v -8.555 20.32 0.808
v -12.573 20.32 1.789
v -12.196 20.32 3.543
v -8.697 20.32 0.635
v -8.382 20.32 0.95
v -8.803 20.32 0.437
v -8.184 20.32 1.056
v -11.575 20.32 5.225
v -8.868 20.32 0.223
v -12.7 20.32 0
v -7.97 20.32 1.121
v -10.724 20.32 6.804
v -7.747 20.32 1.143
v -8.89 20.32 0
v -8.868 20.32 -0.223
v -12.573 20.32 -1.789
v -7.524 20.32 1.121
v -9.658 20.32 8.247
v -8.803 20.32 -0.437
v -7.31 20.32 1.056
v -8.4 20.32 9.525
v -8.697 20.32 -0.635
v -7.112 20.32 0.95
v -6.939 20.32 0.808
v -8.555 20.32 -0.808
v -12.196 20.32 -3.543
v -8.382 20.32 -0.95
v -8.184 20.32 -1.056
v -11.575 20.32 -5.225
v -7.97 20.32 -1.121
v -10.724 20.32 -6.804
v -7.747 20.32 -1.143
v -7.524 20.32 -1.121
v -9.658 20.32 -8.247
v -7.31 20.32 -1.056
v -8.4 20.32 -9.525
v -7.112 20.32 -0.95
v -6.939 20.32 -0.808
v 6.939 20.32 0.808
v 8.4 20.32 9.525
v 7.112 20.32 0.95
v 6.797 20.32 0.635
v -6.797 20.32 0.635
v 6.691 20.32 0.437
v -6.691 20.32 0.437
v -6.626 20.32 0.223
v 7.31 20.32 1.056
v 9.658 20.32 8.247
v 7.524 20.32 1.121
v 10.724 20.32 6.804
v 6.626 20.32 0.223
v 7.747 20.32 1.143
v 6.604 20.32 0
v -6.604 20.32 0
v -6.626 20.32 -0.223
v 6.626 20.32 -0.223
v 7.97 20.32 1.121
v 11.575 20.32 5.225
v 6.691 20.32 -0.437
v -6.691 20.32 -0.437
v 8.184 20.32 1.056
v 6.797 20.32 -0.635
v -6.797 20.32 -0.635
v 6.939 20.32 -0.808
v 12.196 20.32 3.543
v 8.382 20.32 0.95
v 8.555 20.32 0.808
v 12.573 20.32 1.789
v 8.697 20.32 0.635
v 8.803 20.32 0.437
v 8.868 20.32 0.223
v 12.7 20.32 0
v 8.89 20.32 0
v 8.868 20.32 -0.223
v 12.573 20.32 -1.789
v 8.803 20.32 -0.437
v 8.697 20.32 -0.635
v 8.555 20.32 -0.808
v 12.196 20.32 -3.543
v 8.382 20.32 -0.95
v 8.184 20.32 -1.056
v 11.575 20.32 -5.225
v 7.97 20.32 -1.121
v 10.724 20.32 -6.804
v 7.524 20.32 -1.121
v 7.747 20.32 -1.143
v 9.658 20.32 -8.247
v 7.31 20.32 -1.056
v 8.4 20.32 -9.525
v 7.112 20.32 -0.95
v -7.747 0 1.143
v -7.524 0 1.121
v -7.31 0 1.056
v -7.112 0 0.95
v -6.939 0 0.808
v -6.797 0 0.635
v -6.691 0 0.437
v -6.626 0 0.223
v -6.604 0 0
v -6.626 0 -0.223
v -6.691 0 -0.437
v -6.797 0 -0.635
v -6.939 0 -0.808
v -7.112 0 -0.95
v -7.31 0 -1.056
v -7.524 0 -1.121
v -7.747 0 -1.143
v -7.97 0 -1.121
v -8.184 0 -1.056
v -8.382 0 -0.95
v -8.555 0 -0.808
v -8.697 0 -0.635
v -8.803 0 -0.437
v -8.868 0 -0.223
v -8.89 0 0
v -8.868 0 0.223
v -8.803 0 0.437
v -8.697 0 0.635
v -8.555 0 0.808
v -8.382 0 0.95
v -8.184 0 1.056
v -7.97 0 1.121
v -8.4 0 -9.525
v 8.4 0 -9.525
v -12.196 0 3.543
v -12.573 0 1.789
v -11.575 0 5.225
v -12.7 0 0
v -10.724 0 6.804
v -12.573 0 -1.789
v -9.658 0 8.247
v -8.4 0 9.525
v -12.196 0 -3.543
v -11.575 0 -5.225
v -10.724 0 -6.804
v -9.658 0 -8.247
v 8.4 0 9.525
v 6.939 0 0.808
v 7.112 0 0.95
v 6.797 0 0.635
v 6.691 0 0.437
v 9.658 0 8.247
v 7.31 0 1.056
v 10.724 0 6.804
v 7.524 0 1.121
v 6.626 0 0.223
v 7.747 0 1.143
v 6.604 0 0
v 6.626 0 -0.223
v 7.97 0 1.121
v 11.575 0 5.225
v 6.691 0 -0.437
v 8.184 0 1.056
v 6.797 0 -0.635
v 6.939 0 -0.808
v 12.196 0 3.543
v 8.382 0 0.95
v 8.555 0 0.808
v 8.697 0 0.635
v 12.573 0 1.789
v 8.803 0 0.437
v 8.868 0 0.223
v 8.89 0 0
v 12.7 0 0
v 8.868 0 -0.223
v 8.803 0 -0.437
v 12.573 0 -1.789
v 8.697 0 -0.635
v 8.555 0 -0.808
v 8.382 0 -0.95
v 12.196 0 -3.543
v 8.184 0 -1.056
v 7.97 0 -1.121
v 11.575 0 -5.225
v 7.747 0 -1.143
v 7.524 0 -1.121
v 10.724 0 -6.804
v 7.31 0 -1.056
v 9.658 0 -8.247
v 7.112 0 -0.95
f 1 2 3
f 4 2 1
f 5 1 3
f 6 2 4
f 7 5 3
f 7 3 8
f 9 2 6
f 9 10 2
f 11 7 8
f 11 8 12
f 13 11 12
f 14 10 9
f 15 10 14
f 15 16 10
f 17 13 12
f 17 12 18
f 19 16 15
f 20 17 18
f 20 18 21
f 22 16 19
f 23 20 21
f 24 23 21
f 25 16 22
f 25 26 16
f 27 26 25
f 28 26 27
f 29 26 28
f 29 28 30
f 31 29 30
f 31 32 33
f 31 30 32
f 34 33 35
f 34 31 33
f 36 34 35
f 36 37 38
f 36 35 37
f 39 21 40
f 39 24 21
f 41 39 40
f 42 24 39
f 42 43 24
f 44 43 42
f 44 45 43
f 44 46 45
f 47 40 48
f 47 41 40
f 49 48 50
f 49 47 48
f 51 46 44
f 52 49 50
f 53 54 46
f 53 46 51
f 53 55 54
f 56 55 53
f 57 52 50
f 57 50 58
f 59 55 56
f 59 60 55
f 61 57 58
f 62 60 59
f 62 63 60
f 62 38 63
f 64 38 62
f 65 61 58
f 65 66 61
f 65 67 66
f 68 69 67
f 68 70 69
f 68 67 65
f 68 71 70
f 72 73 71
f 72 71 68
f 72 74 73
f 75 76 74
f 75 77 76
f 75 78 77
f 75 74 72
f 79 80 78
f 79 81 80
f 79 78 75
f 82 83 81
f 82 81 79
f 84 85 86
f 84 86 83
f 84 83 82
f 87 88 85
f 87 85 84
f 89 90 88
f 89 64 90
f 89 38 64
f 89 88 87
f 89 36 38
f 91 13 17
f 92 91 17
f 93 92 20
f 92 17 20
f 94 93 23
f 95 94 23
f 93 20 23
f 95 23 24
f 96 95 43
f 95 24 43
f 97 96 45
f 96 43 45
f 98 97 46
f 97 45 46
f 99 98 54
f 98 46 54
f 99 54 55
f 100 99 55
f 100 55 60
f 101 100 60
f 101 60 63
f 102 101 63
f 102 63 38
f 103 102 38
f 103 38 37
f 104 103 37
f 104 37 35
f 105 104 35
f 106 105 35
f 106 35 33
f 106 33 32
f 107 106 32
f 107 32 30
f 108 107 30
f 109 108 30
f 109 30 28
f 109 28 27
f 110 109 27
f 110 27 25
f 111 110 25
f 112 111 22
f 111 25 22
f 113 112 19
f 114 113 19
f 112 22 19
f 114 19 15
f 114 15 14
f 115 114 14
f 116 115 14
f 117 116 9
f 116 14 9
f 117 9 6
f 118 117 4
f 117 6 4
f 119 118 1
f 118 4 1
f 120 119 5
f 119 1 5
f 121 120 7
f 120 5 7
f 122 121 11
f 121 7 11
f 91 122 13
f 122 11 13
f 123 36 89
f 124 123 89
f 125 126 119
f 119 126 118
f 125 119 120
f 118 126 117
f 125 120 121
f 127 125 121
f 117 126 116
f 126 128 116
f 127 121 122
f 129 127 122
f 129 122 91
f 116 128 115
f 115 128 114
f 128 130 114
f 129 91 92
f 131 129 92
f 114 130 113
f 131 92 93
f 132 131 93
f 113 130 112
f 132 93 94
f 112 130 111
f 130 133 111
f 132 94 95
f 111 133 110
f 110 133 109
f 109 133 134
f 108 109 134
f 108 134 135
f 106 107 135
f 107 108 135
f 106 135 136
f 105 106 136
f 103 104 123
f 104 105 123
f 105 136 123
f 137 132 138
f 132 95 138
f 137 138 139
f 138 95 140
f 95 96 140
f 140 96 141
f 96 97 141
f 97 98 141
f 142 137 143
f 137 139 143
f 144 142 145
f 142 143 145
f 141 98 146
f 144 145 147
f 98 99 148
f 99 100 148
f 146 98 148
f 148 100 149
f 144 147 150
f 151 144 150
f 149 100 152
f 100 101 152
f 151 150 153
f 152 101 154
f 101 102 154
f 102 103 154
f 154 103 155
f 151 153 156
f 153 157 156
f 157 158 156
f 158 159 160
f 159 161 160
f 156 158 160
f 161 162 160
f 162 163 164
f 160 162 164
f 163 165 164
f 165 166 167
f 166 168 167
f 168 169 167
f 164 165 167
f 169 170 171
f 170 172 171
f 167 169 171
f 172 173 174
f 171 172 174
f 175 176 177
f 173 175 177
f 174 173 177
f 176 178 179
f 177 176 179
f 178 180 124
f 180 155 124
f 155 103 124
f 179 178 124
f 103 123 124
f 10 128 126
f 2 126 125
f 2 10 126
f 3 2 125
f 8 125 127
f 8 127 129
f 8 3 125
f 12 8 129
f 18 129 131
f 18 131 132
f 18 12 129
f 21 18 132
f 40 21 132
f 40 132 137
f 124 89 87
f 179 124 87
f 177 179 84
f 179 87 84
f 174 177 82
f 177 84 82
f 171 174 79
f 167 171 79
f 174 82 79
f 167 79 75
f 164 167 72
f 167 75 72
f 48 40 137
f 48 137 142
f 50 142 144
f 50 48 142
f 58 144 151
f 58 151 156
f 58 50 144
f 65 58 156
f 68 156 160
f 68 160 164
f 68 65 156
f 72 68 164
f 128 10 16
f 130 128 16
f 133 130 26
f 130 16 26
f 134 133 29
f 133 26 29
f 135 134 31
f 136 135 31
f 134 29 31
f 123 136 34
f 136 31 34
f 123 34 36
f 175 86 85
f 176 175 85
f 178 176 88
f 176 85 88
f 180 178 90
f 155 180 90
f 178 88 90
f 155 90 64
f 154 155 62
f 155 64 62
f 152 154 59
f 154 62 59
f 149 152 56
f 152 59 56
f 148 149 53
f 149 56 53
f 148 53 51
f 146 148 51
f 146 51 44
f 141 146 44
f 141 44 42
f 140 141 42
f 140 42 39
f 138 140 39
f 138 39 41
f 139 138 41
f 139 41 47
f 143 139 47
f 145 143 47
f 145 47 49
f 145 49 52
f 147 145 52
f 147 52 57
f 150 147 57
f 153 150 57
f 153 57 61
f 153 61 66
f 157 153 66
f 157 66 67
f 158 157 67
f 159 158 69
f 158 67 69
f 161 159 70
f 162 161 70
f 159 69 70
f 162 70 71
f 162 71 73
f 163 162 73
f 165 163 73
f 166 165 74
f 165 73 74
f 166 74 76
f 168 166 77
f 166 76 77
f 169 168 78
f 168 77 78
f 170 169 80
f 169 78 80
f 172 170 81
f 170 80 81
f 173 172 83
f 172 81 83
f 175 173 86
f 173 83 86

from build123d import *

# Parameters (mm, degrees)
SKETCH1_W                = 25.4
SKETCH1_H                = 25.4
BOSS_EXTRUDE1_DEPTH      = 20.32
SKETCH2_R                = 1.143
CUT_EXTRUDE1_DEPTH       = 28.11977876
FILLET1_R                = 12.7
CUT_EXTRUDE2_START       = -12.7
CUT_EXTRUDE2_OUTLINE_W   = 20
CUT_EXTRUDE2_OUTLINE_H   = 20.32
CUT_EXTRUDE2_DEPTH       = 3.175
CUT_EXTRUDE2_START_2     = 9.525
CUT_EXTRUDE2_2_OUTLINE_W = 20
CUT_EXTRUDE2_2_OUTLINE_H = 20.32
CUT_EXTRUDE2_2_DEPTH     = 3.175


# Read off the part's stored shape, not the designer's step: Cut-Extrude2
with BuildPart() as part:
    # Sketch1 → Boss-Extrude1 (new body)
    with BuildSketch(Plane(origin=(0, 0, 0), x_dir=(1, 0, 0), z_dir=(0, 1, 0))):
        Rectangle(SKETCH1_W, SKETCH1_H)
    extrude(amount=BOSS_EXTRUDE1_DEPTH)

    # Sketch2 → Cut-Extrude1 (cut, through all)
    with BuildSketch(Plane(origin=(0, 20.32, 0), x_dir=(1, 0, 0), z_dir=(0, 1, 0))):
        with Locations(Location((-7.747, 0, 0), (0, 0, 270))):
            Circle(SKETCH2_R)
        with Locations(Location((7.747, 0, 0), (0, 0, 90))):
            Circle(SKETCH2_R)
    extrude(amount=-CUT_EXTRUDE1_DEPTH, mode=Mode.SUBTRACT)

    # Fillet1
    fillet1_edges = [part.edges().sort_by_distance(p)[0] for p in [
        (-12.7, 10.16, -12.7),
        (12.7, 10.16, -12.7),
        (12.7, 10.16, 12.7),
        (-12.7, 10.16, 12.7),
    ]]
    fillet(fillet1_edges, radius=FILLET1_R - 0.0001)  # a hair under: the kernel refuses the full size

    # Cut-Extrude2 outline → Cut-Extrude2 (cut)
    with BuildSketch(Plane.XY.offset(CUT_EXTRUDE2_START)):
        with Locations((0, 10.16)):
            Rectangle(CUT_EXTRUDE2_OUTLINE_W, CUT_EXTRUDE2_OUTLINE_H)
    extrude(amount=CUT_EXTRUDE2_DEPTH, mode=Mode.SUBTRACT)

    # Cut-Extrude2 2 outline → Cut-Extrude2 2 (cut)
    with BuildSketch(Plane.XY.offset(CUT_EXTRUDE2_START_2)):
        with Locations((0, 10.16)):
            Rectangle(CUT_EXTRUDE2_2_OUTLINE_W, CUT_EXTRUDE2_2_OUTLINE_H)
    extrude(amount=CUT_EXTRUDE2_2_DEPTH, mode=Mode.SUBTRACT)


solid = part.part
